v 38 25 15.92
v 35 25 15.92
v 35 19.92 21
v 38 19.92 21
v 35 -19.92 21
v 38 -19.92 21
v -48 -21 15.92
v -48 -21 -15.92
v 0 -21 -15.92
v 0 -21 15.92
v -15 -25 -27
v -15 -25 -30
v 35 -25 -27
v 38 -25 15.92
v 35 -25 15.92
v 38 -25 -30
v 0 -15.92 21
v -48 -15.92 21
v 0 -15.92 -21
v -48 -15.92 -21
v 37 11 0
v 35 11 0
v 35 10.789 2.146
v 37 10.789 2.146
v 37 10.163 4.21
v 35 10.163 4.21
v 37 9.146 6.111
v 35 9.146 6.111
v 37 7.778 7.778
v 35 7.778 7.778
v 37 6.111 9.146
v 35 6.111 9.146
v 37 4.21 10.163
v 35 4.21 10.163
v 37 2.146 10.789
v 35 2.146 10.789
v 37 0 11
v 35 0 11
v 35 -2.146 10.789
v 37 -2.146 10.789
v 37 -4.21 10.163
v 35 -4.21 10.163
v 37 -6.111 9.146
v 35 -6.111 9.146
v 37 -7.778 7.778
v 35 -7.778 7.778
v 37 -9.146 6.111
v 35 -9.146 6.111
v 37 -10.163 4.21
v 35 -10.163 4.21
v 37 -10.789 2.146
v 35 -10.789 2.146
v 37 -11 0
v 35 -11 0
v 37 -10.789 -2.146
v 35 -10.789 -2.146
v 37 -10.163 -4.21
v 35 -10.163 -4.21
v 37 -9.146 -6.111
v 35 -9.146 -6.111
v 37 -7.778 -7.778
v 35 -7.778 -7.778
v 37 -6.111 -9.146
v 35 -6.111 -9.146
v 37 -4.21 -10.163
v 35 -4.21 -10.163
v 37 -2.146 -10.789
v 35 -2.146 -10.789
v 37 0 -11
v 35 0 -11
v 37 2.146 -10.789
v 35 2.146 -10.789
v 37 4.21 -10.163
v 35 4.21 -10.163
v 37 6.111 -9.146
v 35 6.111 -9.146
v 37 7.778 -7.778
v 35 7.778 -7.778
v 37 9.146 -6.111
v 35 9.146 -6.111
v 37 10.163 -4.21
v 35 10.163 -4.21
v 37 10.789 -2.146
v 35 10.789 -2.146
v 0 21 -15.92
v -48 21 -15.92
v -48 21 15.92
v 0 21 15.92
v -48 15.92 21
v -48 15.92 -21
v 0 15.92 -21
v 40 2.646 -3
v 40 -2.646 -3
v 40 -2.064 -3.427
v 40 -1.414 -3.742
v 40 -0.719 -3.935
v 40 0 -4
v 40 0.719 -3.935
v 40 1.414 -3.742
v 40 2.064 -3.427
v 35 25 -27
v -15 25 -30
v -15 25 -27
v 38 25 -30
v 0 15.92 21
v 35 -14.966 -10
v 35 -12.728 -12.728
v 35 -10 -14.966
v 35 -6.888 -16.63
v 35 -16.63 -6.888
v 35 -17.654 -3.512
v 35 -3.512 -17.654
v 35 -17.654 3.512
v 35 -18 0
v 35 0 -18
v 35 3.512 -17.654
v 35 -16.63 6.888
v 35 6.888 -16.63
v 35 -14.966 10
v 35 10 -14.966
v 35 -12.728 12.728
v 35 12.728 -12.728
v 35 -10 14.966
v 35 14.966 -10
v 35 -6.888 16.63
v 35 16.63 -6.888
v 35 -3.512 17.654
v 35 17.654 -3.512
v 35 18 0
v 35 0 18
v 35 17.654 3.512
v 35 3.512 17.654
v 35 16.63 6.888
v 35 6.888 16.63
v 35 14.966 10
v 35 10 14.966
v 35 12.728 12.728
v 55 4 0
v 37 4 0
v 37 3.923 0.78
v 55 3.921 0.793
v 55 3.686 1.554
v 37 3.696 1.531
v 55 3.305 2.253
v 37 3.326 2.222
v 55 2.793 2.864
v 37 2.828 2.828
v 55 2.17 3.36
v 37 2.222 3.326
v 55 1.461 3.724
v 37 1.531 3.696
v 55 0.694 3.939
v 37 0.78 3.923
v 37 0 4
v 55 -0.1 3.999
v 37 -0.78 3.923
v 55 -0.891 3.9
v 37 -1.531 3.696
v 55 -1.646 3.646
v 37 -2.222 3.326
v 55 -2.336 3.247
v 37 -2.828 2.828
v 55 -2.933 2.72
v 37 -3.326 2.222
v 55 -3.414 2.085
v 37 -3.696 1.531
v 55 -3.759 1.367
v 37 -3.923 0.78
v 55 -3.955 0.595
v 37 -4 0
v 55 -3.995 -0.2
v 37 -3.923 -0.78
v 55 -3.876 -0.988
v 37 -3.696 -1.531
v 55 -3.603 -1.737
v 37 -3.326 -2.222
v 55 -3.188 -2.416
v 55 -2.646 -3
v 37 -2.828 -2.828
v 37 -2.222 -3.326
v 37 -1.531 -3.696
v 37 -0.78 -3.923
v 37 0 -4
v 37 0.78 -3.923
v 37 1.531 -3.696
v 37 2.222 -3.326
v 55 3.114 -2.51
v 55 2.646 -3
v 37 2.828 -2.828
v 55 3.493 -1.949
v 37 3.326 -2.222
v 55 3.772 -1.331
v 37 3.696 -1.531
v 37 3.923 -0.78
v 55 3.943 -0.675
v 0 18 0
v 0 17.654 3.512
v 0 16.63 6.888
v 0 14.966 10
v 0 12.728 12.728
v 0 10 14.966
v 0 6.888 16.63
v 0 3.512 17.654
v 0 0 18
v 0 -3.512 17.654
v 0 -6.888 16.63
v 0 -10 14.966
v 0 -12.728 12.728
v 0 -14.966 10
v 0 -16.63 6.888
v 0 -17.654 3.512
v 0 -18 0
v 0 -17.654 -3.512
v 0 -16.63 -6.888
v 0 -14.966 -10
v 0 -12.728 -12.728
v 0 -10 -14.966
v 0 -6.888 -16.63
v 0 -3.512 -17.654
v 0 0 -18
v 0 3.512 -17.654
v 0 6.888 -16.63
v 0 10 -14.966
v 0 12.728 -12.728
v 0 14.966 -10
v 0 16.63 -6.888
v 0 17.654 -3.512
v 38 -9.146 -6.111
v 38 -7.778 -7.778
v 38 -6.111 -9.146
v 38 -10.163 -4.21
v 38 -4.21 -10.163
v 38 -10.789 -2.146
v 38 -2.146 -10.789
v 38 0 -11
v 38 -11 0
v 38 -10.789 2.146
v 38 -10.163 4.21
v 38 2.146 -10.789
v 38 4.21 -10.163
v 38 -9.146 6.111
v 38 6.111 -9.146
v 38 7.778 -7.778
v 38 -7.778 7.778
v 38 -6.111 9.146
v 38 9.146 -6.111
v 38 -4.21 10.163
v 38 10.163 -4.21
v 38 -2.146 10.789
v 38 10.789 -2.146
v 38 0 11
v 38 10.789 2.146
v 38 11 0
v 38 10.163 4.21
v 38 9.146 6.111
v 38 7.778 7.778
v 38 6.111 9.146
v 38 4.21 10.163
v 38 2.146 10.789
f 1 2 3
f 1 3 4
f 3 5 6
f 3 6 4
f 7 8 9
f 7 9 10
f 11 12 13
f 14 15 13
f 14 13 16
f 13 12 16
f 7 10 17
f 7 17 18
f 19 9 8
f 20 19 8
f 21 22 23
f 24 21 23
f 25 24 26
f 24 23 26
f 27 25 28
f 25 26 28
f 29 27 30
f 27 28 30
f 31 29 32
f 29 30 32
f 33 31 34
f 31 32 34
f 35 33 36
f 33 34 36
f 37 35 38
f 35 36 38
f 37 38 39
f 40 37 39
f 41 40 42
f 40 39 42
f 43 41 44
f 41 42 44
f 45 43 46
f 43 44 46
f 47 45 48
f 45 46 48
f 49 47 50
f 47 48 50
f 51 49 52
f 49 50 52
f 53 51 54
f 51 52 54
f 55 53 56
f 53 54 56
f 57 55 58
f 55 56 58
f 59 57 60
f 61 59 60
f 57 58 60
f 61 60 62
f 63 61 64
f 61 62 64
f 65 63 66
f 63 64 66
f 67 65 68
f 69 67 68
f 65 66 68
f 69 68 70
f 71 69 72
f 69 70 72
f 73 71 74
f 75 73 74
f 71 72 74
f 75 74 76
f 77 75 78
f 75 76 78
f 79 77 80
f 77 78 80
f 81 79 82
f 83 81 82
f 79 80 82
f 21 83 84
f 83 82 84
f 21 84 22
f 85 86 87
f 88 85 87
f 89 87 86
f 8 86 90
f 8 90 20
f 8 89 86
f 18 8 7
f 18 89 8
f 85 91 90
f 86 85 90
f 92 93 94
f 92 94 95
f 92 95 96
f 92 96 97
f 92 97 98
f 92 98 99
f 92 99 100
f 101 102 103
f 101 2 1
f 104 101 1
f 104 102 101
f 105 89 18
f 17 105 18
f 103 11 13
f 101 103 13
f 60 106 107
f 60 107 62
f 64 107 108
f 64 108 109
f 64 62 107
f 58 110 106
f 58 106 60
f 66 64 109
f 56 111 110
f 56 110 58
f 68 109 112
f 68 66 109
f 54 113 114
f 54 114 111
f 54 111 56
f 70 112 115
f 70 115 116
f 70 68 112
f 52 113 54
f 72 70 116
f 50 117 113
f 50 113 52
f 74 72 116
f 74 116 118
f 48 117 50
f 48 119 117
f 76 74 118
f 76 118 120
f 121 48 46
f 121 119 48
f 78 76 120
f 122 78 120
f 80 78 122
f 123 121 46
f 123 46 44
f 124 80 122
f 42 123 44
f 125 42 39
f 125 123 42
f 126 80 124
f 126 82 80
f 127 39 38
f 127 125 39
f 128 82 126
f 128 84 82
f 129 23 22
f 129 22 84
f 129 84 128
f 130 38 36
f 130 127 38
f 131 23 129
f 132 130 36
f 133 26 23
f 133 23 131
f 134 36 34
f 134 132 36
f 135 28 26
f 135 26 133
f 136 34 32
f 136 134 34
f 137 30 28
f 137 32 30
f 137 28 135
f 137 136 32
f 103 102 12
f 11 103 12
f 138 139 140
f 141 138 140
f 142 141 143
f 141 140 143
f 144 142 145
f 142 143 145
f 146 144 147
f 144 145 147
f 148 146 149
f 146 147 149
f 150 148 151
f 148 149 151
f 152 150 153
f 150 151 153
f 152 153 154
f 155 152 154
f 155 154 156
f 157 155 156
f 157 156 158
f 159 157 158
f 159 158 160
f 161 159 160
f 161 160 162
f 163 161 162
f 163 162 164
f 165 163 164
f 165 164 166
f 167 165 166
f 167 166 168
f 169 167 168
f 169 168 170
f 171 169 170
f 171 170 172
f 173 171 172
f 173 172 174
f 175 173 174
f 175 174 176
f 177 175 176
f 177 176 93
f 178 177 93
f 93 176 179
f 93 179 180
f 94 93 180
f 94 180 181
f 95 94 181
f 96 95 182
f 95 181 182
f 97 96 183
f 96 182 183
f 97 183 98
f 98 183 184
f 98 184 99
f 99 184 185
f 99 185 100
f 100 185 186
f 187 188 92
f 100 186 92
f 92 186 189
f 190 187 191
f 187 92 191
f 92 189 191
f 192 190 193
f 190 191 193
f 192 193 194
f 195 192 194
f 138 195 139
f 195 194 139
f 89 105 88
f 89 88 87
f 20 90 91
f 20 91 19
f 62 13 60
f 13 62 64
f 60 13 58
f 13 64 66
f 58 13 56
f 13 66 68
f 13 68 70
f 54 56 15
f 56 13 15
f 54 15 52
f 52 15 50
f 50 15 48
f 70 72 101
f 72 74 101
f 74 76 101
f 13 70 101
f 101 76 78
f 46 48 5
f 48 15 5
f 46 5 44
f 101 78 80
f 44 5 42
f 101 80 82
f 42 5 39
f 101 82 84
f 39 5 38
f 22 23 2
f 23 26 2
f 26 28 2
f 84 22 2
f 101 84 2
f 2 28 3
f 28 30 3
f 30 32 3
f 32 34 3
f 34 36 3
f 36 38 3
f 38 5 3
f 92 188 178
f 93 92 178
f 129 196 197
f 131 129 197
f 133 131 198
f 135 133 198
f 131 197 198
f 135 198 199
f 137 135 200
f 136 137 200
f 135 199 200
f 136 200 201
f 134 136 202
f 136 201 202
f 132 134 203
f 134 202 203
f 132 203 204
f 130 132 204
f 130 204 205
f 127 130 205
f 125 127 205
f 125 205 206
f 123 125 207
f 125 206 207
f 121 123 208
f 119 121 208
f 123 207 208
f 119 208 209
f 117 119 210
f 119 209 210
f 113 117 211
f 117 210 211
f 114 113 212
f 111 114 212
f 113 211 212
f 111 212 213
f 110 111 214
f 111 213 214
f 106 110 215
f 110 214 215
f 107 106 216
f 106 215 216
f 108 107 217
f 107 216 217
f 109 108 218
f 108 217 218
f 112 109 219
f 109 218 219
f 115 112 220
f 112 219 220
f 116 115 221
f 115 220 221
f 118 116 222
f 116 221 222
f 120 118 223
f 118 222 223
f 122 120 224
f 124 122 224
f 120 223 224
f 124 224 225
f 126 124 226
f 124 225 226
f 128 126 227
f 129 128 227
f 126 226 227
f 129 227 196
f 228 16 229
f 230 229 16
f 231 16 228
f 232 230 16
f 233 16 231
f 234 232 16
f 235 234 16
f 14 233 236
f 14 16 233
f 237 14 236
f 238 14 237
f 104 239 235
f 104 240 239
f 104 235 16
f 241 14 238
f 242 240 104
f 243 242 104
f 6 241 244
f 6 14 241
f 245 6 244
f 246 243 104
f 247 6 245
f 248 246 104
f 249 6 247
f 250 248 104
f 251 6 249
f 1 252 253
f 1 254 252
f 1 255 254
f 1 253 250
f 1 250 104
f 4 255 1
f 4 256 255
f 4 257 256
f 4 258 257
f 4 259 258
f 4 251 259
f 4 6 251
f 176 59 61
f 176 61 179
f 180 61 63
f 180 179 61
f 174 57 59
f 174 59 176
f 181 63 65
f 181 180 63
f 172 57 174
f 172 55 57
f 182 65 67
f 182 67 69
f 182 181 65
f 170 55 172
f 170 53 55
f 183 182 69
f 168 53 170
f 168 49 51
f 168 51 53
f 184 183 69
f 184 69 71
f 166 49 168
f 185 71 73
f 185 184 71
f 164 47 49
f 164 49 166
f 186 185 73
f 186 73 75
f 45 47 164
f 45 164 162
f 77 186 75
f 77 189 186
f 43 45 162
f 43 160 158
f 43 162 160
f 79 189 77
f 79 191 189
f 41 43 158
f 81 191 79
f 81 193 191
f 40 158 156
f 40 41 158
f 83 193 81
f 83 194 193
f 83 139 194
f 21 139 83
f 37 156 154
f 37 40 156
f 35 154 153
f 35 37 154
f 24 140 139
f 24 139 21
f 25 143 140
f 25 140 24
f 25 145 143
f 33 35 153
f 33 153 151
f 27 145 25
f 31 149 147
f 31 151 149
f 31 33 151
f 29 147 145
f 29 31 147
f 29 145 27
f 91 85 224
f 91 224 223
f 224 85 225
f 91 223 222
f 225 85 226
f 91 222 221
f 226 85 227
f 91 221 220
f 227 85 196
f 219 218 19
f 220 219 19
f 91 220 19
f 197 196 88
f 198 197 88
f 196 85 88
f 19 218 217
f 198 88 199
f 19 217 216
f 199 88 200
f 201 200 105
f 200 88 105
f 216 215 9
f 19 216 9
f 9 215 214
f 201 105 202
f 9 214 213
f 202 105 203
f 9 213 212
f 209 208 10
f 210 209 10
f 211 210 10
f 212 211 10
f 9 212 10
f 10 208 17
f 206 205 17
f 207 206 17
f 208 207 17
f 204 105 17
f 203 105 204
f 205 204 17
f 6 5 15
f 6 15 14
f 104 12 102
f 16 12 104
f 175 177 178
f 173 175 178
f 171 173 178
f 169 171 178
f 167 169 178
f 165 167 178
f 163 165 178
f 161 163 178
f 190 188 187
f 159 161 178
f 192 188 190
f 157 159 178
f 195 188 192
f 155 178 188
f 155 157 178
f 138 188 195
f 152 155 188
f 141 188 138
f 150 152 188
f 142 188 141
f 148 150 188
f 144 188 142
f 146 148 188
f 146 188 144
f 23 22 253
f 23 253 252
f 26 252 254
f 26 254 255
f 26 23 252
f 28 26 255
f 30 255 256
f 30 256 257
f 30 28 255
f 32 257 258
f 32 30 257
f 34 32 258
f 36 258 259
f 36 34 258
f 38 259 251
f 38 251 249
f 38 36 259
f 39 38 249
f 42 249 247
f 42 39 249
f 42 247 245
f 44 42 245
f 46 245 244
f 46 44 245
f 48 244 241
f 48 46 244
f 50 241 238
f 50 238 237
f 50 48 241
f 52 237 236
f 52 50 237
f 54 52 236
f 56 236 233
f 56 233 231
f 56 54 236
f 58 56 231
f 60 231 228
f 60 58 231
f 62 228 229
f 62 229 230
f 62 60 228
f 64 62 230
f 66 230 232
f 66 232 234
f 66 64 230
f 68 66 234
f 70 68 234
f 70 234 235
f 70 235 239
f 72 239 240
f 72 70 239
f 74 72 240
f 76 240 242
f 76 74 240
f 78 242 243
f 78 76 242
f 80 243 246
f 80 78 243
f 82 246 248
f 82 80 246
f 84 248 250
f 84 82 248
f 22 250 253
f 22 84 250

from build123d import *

# Parameters (mm, degrees)
F0_R      = 18
F1_DEPTH  = 35
F2_W      = 42
F2_H      = 42
F3_DEPTH  = 48
F4_SIZE   = 5.08
F5_R      = 11
F6_DEPTH  = 2
F7_R      = 4
F8_DEPTH  = 18
F10_DEPTH = 15
F11_W     = 50
F11_H     = 51
F11_R     = 11
F12_DEPTH = 3
F13_SIZE  = 5.08
F14_W     = 50
F14_H     = 50
F15_DEPTH = 3


with BuildPart() as f1:
    # F0 (on Right) → F1 (new body)
    with BuildSketch(Plane.YZ):
        Circle(F0_R)
    extrude(amount=F1_DEPTH)

    # F2 (on face) → F3 (join)
    with BuildSketch(Plane(origin=(0, 0, 0), x_dir=(0, -1, 0), z_dir=(-1, 0, 0))):
        Rectangle(F2_W, F2_H)
    extrude(amount=F3_DEPTH)

    # F4
    f4_edges = [f1.edges().sort_by_distance(p)[0] for p in [
        (-24, -21, 21),
        (-24, 21, 21),
        (-24, 21, -21),
        (-24, -21, -21),
    ]]
    chamfer(f4_edges, length=F4_SIZE)

    # F5 (on face) → F6 (join)
    with BuildSketch(Plane.YZ.offset(35)):
        Circle(F5_R)
    extrude(amount=F6_DEPTH)

    # F7 (on face) → F8 (join)
    with BuildSketch(Plane.YZ.offset(37)):
        Circle(F7_R)
    extrude(amount=F8_DEPTH)

    # F9 (on face) → F10 (cut)
    with BuildSketch(Plane.YZ.offset(55)):
        with BuildLine():
            Line((2.645751, -3), (-2.645751, -3))
            ThreePointArc((-2.645751, -3), (0, -4), (2.645751, -3))
        make_face()
    extrude(amount=-F10_DEPTH, mode=Mode.SUBTRACT)


with BuildPart() as f12:
    # F11 (on face) → F12 (new body)
    with BuildSketch(Plane.YZ.offset(35)):
        with Locations((0, -4.5)):
            Rectangle(F11_W, F11_H)
        Circle(F11_R, mode=Mode.SUBTRACT)
    extrude(amount=F12_DEPTH)

    # F13
    f13_edges = [f12.edges().sort_by_distance(p)[0] for p in [
        (36.5, -25, 21),
        (36.5, 25, 21),
    ]]
    chamfer(f13_edges, length=F13_SIZE)

    # F14 (on face) → F15 (join)
    with BuildSketch(Plane(origin=(0, 0, -30), x_dir=(1, 0, 0), z_dir=(0, 0, -1))):
        with Locations((10, 0)):
            Rectangle(F14_W, F14_H)
    extrude(amount=-F15_DEPTH)


solid = Compound([f1.part, f12.part])
